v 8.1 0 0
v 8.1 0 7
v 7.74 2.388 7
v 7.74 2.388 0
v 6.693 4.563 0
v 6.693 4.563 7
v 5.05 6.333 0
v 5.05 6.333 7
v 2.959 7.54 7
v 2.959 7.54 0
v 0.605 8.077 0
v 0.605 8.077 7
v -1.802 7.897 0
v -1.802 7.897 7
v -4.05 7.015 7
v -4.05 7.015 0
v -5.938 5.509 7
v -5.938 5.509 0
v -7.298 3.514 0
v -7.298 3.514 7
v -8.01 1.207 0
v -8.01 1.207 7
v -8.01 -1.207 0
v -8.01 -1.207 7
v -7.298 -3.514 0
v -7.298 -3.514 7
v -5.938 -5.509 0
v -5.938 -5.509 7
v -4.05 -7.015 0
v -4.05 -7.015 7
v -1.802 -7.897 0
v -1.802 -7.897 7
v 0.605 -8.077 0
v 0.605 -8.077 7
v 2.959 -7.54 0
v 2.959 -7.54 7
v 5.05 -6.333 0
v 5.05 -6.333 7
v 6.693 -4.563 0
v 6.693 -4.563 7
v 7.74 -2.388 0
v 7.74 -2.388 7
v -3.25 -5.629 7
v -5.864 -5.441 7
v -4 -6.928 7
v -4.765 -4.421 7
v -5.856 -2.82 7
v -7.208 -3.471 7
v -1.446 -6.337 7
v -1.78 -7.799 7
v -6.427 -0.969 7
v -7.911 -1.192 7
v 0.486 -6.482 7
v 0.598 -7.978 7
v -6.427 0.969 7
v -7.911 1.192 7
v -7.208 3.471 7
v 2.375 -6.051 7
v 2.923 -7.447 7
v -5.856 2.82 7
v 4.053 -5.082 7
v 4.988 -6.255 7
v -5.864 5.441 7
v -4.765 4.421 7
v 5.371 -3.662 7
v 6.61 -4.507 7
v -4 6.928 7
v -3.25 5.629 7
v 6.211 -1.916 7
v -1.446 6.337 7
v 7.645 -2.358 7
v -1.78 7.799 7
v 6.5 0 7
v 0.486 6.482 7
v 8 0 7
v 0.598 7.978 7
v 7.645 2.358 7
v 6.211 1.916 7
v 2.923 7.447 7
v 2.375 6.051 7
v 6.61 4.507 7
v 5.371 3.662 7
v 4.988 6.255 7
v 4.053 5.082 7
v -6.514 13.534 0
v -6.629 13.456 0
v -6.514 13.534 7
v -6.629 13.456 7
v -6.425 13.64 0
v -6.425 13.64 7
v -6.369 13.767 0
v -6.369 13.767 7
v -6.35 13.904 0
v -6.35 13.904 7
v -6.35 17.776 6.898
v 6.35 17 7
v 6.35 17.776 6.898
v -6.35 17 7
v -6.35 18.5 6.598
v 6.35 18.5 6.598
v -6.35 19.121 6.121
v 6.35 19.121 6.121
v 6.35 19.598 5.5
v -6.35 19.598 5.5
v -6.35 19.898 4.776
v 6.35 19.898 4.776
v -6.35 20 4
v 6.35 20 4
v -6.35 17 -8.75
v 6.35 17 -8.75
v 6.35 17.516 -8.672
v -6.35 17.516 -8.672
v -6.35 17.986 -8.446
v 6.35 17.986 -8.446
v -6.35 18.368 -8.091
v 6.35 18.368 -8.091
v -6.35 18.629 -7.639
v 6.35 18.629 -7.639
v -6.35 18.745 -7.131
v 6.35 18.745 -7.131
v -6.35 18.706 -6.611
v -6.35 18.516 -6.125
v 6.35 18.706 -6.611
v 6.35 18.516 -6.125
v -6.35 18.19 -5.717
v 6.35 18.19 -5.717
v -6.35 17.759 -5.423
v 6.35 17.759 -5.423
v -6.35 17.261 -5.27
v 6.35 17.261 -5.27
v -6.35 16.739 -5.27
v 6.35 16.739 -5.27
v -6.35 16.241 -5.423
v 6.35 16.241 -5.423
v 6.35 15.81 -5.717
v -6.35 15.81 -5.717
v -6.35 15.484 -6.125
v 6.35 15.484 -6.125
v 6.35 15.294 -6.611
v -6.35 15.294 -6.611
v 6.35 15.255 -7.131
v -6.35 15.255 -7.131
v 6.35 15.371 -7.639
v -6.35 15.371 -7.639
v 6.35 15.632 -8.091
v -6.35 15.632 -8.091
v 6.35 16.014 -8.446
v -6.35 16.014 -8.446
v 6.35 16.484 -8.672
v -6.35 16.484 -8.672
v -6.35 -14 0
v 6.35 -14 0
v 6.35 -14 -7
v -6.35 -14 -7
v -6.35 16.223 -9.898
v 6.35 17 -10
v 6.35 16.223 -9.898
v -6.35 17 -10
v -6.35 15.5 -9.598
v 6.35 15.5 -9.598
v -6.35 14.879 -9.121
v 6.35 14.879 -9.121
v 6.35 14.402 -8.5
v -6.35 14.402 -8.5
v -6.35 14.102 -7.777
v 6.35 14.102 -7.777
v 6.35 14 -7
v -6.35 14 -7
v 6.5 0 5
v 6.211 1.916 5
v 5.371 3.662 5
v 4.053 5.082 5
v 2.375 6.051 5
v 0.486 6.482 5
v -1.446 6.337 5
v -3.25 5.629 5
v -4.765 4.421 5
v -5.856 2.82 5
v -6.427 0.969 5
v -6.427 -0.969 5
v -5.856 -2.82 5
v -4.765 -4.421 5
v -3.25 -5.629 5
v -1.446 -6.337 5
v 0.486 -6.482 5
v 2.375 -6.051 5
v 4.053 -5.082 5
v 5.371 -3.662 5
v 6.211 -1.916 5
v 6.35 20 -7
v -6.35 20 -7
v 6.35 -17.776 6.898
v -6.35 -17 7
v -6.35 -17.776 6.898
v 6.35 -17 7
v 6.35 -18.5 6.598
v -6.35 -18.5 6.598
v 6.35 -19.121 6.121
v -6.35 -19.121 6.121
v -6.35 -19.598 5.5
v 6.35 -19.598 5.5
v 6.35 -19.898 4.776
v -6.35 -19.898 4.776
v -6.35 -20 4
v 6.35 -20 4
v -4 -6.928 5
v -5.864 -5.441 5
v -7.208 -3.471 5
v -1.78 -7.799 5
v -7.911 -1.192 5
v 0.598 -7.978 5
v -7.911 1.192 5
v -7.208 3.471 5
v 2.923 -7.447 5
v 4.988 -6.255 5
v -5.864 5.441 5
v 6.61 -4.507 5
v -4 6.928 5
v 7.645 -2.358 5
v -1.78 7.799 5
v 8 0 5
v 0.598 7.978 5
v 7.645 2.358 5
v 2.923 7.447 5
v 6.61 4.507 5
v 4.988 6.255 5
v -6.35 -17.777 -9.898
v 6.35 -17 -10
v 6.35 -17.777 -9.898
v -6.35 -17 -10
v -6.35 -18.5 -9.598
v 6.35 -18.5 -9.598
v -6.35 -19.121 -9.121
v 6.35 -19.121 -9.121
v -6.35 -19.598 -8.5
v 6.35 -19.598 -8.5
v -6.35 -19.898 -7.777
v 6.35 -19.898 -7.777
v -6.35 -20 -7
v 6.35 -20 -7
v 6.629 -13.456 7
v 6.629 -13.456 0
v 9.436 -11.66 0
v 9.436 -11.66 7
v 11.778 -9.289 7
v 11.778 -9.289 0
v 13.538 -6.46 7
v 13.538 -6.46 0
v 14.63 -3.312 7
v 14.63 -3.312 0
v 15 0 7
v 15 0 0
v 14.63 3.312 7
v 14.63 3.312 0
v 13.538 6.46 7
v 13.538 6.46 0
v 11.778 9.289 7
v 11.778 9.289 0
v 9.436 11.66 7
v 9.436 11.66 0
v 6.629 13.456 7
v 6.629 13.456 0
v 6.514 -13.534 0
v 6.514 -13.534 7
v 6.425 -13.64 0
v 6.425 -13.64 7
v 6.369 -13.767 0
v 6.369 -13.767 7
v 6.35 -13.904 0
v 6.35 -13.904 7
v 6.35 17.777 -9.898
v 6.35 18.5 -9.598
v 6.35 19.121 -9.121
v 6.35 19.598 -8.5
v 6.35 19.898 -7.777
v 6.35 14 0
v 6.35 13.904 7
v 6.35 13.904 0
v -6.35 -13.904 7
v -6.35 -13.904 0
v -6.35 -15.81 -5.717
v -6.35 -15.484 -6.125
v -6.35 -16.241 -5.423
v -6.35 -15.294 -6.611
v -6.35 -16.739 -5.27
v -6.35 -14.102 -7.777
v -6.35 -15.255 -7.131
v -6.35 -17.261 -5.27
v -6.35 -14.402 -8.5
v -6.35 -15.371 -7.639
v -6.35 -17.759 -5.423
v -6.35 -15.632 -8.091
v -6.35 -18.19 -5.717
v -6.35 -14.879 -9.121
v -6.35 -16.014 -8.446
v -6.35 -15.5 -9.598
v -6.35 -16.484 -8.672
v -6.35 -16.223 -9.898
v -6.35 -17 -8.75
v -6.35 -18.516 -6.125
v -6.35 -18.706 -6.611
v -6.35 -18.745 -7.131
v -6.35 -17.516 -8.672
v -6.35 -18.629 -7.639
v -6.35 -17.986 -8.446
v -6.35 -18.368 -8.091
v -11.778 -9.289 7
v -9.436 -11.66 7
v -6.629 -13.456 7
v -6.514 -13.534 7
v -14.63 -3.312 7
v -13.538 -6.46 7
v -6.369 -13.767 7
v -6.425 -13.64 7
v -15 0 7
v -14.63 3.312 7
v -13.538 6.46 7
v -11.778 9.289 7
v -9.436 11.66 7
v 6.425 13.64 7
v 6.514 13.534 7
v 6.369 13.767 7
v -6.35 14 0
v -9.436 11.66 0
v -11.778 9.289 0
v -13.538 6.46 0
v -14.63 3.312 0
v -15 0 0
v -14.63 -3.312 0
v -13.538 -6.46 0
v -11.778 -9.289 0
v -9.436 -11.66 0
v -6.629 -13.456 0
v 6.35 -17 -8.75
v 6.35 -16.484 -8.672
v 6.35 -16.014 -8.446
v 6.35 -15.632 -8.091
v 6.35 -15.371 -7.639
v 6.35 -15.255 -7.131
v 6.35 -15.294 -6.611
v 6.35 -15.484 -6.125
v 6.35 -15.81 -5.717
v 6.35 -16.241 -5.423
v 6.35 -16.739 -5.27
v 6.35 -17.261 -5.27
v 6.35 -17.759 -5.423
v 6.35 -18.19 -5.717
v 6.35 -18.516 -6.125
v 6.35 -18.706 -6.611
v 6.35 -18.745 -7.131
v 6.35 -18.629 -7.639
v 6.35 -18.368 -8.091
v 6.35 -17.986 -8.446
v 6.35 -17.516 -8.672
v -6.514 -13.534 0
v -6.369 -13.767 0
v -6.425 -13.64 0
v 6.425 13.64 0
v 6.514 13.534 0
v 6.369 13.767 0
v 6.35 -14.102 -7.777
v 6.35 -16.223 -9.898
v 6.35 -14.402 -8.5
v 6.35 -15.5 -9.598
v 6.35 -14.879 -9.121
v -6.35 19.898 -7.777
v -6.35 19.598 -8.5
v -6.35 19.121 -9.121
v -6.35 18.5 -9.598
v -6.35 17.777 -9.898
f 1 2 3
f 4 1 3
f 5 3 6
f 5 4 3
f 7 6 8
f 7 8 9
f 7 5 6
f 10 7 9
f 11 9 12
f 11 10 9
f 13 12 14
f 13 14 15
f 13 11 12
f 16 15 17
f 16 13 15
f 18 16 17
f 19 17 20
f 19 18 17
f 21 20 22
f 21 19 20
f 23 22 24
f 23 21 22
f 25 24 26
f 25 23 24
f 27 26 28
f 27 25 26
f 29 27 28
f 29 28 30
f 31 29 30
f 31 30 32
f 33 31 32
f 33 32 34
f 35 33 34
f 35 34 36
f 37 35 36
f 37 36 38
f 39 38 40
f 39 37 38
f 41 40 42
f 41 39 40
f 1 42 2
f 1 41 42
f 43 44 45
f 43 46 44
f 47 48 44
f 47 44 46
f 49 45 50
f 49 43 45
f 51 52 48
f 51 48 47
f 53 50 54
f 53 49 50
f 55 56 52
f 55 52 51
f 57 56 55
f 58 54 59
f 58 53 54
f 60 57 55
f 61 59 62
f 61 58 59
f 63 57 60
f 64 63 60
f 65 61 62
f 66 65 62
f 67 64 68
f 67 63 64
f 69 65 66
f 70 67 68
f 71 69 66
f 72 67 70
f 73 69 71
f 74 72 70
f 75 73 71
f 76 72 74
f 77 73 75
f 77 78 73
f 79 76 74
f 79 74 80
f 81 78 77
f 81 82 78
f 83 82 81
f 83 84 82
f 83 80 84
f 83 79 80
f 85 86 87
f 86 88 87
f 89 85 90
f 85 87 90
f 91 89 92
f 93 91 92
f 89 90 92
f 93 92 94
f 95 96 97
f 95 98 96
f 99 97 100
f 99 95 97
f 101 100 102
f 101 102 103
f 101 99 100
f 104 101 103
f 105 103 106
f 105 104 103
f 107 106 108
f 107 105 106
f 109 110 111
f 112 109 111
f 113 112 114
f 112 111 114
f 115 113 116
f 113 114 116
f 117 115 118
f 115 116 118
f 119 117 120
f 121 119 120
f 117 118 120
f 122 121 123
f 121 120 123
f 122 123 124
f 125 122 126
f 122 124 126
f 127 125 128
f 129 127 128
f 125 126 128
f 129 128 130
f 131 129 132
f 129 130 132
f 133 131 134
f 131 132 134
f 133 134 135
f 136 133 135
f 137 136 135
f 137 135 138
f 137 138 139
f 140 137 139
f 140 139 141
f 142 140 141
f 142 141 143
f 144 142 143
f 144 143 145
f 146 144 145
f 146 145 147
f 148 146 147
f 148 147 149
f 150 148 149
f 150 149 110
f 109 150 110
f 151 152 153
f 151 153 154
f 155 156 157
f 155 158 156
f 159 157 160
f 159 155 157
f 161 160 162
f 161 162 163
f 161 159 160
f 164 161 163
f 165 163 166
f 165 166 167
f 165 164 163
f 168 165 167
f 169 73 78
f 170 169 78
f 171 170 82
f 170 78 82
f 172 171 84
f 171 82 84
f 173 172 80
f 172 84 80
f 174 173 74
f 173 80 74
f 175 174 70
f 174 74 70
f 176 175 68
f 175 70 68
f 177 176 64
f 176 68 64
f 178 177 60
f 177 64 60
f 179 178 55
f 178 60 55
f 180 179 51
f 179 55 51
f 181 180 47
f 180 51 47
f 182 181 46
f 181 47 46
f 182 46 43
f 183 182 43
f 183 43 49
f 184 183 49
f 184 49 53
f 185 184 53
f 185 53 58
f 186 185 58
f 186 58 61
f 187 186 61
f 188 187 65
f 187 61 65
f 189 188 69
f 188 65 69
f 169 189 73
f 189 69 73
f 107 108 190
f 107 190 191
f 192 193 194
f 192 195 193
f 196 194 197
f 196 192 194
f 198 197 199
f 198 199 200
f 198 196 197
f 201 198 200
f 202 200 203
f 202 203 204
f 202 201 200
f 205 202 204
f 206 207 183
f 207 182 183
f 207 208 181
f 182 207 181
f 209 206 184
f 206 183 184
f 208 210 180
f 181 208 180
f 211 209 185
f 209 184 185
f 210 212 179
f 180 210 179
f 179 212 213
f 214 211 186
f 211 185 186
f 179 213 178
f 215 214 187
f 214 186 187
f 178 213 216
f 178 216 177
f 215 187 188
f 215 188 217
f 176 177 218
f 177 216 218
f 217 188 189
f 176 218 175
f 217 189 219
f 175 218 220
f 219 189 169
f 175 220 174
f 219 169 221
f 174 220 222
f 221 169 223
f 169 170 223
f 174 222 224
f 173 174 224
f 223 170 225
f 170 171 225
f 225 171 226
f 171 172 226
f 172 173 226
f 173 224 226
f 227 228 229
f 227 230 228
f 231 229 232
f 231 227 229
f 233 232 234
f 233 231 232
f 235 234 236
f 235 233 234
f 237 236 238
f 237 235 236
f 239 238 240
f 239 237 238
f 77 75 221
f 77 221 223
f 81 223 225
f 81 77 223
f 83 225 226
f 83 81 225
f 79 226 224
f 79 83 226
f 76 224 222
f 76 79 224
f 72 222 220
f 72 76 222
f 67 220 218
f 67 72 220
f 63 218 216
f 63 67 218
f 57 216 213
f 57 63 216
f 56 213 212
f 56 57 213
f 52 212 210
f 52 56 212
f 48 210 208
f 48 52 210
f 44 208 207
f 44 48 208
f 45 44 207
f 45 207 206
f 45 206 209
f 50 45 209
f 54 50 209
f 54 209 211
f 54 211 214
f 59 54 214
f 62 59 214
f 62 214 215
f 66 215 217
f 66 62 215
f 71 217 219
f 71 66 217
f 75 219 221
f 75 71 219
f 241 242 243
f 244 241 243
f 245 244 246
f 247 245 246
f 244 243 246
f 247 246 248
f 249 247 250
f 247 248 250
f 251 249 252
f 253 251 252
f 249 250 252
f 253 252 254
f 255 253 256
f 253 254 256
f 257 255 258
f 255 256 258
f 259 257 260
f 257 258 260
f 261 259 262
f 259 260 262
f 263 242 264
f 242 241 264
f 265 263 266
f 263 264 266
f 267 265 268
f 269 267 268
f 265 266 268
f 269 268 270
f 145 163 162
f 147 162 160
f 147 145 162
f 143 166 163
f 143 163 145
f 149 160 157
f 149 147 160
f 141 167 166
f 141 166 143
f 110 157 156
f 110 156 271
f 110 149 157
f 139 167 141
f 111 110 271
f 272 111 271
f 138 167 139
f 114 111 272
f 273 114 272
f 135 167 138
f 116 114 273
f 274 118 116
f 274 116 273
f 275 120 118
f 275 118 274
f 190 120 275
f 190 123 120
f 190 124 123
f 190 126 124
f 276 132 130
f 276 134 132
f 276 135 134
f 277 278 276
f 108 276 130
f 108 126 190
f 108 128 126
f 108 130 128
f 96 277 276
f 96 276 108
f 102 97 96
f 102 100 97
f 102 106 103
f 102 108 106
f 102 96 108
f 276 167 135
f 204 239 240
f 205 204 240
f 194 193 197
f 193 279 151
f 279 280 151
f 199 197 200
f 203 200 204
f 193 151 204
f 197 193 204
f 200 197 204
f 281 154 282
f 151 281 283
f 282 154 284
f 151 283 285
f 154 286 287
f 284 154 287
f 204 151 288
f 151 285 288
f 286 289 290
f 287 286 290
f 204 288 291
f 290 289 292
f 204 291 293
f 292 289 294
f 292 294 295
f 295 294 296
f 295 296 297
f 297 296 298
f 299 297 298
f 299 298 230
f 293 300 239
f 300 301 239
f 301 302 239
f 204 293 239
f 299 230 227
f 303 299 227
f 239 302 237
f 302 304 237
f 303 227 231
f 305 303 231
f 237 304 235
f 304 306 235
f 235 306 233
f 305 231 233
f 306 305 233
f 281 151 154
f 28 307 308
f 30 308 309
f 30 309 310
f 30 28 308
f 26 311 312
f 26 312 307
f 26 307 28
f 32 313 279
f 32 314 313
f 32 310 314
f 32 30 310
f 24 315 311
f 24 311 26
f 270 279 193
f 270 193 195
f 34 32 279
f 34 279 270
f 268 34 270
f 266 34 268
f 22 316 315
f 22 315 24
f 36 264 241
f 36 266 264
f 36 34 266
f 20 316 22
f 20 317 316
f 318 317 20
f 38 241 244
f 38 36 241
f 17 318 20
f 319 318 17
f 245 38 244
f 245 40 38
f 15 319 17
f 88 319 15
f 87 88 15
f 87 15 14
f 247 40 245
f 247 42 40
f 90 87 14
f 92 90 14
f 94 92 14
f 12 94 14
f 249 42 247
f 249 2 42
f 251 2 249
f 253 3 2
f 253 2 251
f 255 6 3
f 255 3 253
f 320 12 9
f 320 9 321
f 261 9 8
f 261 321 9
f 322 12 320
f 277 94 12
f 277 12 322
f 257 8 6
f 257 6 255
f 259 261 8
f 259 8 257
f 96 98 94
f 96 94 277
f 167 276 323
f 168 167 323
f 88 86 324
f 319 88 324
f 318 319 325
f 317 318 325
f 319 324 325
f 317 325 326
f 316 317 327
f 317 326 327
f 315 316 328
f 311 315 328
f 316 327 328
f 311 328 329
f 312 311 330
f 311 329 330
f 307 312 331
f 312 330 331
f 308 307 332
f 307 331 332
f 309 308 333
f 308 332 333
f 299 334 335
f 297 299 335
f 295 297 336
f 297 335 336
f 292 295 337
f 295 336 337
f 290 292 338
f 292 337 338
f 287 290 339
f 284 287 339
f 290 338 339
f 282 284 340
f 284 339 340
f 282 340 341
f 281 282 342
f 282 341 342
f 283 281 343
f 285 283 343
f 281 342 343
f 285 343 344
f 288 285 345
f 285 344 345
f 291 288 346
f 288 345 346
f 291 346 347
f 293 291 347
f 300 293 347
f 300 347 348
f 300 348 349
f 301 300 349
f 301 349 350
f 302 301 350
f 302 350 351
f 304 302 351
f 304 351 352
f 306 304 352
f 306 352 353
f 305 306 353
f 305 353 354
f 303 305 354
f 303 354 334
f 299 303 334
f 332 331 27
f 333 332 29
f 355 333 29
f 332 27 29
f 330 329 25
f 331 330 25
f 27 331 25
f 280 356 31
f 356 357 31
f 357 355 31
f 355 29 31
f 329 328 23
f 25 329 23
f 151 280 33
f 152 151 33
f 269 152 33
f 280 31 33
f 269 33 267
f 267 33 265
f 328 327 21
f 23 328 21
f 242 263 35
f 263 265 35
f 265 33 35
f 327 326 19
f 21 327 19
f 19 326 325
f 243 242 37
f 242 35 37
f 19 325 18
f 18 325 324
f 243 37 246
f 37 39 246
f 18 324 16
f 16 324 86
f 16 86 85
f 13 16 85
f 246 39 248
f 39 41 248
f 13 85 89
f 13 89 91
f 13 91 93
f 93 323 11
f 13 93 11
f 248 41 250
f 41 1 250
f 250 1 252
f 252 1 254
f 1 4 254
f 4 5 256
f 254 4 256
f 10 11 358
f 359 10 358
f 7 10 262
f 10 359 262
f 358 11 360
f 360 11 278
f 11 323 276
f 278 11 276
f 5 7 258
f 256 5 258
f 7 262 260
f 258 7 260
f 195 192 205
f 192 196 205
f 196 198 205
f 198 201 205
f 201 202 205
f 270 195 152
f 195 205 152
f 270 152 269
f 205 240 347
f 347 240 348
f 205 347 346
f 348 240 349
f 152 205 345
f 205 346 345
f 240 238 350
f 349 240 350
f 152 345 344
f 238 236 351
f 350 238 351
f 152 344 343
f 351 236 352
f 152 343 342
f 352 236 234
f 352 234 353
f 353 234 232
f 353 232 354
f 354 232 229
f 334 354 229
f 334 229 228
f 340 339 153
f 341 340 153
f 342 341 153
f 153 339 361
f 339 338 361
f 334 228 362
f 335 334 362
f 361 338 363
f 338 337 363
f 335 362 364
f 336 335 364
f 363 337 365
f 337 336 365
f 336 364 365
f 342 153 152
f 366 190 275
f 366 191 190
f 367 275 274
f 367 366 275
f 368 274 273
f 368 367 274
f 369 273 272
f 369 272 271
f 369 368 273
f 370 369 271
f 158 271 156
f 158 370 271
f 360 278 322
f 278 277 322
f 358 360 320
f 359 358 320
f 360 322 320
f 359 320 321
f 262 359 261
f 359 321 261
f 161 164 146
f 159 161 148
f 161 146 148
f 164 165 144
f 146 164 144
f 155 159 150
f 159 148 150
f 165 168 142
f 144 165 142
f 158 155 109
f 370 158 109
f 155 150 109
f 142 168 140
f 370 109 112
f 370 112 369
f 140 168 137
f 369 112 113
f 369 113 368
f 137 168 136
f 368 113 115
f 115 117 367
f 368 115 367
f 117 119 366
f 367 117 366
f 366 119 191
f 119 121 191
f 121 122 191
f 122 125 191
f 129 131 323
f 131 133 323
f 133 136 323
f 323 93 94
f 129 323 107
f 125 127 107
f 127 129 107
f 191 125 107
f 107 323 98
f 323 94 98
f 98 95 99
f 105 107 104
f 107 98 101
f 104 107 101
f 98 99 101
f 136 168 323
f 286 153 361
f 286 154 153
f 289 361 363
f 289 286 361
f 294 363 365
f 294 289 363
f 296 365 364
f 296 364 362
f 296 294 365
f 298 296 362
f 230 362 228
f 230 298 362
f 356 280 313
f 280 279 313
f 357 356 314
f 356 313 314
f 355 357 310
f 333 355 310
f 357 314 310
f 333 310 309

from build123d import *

# Parameters (mm, degrees)
CROQUIS1_R              = 8.1
SALIENTE_EXTRUIR4_DEPTH = 7
CROQUIS5_W              = 12.7
CROQUIS5_H              = 6
SALIENTE_EXTRUIR5_DEPTH = 10
REDONDEO1_R             = 3
CROQUIS7_R              = 1.75
CORTAR_EXTRUIR1_DEPTH   = 31.916379154
CROQUIS8_R              = 8
CROQUIS8_R_2            = 6.5
SALIENTE_EXTRUIR6_DEPTH = 2
REDONDEO3_R             = 3
REDONDEO4_R             = 0.5


with BuildPart() as part:
    # Croquis1 → Saliente-Extruir4 (new body)
    with BuildSketch(Plane.XY):
        with BuildLine():
            Line((-6.35, -20), (6.35, -20))
            Line((6.35, -20), (6.35, -13.589610002))
            ThreePointArc((6.35, -13.589610002), (15, 0), (6.35, 13.589610002))
            Line((6.35, 13.589610002), (6.35, 20))
            Line((6.35, 20), (-6.35, 20))
            Line((-6.35, 20), (-6.35, 13.589610002))
            ThreePointArc((-6.35, 13.589610002), (-15, 0), (-6.35, -13.589610002))
            Line((-6.35, -13.589610002), (-6.35, -20))
        make_face()
        Circle(CROQUIS1_R, mode=Mode.SUBTRACT)
    extrude(amount=SALIENTE_EXTRUIR4_DEPTH)

    # Croquis5 → Saliente-Extruir5 (add)
    with BuildSketch(Plane(origin=(0, 0, 0), x_dir=(-1, 0, 0), z_dir=(0, 0, -1))):
        with Locations((0, 17)):
            Rectangle(CROQUIS5_W, CROQUIS5_H)
        with Locations((0, -17)):
            Rectangle(CROQUIS5_W, CROQUIS5_H)
    extrude(amount=SALIENTE_EXTRUIR5_DEPTH)

    # Redondeo1
    redondeo1_edges = [part.edges().sort_by_distance(p)[0] for p in [
        (0, 14, -10),
        (0, 20, -10),
        (0, -14, -10),
        (0, -20, -10),
    ]]
    fillet(redondeo1_edges, radius=REDONDEO1_R - 0.0001)  # a hair under: the kernel refuses the full size

    # Croquis7 → Cortar-Extruir1 (cut, through all)
    with BuildSketch(Plane(origin=(6.35, 0, 0), x_dir=(0, 0, -1), z_dir=(1, 0, 0))):
        with Locations((7, 17)):
            Circle(CROQUIS7_R)
        with Locations((7, -17)):
            Circle(CROQUIS7_R)
    extrude(amount=-CORTAR_EXTRUIR1_DEPTH, mode=Mode.SUBTRACT)

    # Redondeo3
    redondeo3_edges = [part.edges().sort_by_distance(p)[0] for p in [
        (0, -20, 7),
        (0, 20, 7),
    ]]
    fillet(redondeo3_edges, radius=REDONDEO3_R)

    # Redondeo4
    redondeo4_edges = [part.edges().sort_by_distance(p)[0] for p in [
        (6.35, 13.589610002, 3.5),
        (6.35, -13.589610002, 3.5),
        (-6.35, -13.589610002, 3.5),
        (-6.35, 13.589610002, 3.5),
    ]]
    fillet(redondeo4_edges, radius=REDONDEO4_R)


with BuildPart() as body_2:
    # Croquis8 → Saliente-Extruir6 (new body)
    with BuildSketch(Plane.XY.offset(7)):
        Circle(CROQUIS8_R)
        Circle(CROQUIS8_R_2, mode=Mode.SUBTRACT)
    extrude(amount=-SALIENTE_EXTRUIR6_DEPTH)


solid = Compound([part.part, body_2.part])
